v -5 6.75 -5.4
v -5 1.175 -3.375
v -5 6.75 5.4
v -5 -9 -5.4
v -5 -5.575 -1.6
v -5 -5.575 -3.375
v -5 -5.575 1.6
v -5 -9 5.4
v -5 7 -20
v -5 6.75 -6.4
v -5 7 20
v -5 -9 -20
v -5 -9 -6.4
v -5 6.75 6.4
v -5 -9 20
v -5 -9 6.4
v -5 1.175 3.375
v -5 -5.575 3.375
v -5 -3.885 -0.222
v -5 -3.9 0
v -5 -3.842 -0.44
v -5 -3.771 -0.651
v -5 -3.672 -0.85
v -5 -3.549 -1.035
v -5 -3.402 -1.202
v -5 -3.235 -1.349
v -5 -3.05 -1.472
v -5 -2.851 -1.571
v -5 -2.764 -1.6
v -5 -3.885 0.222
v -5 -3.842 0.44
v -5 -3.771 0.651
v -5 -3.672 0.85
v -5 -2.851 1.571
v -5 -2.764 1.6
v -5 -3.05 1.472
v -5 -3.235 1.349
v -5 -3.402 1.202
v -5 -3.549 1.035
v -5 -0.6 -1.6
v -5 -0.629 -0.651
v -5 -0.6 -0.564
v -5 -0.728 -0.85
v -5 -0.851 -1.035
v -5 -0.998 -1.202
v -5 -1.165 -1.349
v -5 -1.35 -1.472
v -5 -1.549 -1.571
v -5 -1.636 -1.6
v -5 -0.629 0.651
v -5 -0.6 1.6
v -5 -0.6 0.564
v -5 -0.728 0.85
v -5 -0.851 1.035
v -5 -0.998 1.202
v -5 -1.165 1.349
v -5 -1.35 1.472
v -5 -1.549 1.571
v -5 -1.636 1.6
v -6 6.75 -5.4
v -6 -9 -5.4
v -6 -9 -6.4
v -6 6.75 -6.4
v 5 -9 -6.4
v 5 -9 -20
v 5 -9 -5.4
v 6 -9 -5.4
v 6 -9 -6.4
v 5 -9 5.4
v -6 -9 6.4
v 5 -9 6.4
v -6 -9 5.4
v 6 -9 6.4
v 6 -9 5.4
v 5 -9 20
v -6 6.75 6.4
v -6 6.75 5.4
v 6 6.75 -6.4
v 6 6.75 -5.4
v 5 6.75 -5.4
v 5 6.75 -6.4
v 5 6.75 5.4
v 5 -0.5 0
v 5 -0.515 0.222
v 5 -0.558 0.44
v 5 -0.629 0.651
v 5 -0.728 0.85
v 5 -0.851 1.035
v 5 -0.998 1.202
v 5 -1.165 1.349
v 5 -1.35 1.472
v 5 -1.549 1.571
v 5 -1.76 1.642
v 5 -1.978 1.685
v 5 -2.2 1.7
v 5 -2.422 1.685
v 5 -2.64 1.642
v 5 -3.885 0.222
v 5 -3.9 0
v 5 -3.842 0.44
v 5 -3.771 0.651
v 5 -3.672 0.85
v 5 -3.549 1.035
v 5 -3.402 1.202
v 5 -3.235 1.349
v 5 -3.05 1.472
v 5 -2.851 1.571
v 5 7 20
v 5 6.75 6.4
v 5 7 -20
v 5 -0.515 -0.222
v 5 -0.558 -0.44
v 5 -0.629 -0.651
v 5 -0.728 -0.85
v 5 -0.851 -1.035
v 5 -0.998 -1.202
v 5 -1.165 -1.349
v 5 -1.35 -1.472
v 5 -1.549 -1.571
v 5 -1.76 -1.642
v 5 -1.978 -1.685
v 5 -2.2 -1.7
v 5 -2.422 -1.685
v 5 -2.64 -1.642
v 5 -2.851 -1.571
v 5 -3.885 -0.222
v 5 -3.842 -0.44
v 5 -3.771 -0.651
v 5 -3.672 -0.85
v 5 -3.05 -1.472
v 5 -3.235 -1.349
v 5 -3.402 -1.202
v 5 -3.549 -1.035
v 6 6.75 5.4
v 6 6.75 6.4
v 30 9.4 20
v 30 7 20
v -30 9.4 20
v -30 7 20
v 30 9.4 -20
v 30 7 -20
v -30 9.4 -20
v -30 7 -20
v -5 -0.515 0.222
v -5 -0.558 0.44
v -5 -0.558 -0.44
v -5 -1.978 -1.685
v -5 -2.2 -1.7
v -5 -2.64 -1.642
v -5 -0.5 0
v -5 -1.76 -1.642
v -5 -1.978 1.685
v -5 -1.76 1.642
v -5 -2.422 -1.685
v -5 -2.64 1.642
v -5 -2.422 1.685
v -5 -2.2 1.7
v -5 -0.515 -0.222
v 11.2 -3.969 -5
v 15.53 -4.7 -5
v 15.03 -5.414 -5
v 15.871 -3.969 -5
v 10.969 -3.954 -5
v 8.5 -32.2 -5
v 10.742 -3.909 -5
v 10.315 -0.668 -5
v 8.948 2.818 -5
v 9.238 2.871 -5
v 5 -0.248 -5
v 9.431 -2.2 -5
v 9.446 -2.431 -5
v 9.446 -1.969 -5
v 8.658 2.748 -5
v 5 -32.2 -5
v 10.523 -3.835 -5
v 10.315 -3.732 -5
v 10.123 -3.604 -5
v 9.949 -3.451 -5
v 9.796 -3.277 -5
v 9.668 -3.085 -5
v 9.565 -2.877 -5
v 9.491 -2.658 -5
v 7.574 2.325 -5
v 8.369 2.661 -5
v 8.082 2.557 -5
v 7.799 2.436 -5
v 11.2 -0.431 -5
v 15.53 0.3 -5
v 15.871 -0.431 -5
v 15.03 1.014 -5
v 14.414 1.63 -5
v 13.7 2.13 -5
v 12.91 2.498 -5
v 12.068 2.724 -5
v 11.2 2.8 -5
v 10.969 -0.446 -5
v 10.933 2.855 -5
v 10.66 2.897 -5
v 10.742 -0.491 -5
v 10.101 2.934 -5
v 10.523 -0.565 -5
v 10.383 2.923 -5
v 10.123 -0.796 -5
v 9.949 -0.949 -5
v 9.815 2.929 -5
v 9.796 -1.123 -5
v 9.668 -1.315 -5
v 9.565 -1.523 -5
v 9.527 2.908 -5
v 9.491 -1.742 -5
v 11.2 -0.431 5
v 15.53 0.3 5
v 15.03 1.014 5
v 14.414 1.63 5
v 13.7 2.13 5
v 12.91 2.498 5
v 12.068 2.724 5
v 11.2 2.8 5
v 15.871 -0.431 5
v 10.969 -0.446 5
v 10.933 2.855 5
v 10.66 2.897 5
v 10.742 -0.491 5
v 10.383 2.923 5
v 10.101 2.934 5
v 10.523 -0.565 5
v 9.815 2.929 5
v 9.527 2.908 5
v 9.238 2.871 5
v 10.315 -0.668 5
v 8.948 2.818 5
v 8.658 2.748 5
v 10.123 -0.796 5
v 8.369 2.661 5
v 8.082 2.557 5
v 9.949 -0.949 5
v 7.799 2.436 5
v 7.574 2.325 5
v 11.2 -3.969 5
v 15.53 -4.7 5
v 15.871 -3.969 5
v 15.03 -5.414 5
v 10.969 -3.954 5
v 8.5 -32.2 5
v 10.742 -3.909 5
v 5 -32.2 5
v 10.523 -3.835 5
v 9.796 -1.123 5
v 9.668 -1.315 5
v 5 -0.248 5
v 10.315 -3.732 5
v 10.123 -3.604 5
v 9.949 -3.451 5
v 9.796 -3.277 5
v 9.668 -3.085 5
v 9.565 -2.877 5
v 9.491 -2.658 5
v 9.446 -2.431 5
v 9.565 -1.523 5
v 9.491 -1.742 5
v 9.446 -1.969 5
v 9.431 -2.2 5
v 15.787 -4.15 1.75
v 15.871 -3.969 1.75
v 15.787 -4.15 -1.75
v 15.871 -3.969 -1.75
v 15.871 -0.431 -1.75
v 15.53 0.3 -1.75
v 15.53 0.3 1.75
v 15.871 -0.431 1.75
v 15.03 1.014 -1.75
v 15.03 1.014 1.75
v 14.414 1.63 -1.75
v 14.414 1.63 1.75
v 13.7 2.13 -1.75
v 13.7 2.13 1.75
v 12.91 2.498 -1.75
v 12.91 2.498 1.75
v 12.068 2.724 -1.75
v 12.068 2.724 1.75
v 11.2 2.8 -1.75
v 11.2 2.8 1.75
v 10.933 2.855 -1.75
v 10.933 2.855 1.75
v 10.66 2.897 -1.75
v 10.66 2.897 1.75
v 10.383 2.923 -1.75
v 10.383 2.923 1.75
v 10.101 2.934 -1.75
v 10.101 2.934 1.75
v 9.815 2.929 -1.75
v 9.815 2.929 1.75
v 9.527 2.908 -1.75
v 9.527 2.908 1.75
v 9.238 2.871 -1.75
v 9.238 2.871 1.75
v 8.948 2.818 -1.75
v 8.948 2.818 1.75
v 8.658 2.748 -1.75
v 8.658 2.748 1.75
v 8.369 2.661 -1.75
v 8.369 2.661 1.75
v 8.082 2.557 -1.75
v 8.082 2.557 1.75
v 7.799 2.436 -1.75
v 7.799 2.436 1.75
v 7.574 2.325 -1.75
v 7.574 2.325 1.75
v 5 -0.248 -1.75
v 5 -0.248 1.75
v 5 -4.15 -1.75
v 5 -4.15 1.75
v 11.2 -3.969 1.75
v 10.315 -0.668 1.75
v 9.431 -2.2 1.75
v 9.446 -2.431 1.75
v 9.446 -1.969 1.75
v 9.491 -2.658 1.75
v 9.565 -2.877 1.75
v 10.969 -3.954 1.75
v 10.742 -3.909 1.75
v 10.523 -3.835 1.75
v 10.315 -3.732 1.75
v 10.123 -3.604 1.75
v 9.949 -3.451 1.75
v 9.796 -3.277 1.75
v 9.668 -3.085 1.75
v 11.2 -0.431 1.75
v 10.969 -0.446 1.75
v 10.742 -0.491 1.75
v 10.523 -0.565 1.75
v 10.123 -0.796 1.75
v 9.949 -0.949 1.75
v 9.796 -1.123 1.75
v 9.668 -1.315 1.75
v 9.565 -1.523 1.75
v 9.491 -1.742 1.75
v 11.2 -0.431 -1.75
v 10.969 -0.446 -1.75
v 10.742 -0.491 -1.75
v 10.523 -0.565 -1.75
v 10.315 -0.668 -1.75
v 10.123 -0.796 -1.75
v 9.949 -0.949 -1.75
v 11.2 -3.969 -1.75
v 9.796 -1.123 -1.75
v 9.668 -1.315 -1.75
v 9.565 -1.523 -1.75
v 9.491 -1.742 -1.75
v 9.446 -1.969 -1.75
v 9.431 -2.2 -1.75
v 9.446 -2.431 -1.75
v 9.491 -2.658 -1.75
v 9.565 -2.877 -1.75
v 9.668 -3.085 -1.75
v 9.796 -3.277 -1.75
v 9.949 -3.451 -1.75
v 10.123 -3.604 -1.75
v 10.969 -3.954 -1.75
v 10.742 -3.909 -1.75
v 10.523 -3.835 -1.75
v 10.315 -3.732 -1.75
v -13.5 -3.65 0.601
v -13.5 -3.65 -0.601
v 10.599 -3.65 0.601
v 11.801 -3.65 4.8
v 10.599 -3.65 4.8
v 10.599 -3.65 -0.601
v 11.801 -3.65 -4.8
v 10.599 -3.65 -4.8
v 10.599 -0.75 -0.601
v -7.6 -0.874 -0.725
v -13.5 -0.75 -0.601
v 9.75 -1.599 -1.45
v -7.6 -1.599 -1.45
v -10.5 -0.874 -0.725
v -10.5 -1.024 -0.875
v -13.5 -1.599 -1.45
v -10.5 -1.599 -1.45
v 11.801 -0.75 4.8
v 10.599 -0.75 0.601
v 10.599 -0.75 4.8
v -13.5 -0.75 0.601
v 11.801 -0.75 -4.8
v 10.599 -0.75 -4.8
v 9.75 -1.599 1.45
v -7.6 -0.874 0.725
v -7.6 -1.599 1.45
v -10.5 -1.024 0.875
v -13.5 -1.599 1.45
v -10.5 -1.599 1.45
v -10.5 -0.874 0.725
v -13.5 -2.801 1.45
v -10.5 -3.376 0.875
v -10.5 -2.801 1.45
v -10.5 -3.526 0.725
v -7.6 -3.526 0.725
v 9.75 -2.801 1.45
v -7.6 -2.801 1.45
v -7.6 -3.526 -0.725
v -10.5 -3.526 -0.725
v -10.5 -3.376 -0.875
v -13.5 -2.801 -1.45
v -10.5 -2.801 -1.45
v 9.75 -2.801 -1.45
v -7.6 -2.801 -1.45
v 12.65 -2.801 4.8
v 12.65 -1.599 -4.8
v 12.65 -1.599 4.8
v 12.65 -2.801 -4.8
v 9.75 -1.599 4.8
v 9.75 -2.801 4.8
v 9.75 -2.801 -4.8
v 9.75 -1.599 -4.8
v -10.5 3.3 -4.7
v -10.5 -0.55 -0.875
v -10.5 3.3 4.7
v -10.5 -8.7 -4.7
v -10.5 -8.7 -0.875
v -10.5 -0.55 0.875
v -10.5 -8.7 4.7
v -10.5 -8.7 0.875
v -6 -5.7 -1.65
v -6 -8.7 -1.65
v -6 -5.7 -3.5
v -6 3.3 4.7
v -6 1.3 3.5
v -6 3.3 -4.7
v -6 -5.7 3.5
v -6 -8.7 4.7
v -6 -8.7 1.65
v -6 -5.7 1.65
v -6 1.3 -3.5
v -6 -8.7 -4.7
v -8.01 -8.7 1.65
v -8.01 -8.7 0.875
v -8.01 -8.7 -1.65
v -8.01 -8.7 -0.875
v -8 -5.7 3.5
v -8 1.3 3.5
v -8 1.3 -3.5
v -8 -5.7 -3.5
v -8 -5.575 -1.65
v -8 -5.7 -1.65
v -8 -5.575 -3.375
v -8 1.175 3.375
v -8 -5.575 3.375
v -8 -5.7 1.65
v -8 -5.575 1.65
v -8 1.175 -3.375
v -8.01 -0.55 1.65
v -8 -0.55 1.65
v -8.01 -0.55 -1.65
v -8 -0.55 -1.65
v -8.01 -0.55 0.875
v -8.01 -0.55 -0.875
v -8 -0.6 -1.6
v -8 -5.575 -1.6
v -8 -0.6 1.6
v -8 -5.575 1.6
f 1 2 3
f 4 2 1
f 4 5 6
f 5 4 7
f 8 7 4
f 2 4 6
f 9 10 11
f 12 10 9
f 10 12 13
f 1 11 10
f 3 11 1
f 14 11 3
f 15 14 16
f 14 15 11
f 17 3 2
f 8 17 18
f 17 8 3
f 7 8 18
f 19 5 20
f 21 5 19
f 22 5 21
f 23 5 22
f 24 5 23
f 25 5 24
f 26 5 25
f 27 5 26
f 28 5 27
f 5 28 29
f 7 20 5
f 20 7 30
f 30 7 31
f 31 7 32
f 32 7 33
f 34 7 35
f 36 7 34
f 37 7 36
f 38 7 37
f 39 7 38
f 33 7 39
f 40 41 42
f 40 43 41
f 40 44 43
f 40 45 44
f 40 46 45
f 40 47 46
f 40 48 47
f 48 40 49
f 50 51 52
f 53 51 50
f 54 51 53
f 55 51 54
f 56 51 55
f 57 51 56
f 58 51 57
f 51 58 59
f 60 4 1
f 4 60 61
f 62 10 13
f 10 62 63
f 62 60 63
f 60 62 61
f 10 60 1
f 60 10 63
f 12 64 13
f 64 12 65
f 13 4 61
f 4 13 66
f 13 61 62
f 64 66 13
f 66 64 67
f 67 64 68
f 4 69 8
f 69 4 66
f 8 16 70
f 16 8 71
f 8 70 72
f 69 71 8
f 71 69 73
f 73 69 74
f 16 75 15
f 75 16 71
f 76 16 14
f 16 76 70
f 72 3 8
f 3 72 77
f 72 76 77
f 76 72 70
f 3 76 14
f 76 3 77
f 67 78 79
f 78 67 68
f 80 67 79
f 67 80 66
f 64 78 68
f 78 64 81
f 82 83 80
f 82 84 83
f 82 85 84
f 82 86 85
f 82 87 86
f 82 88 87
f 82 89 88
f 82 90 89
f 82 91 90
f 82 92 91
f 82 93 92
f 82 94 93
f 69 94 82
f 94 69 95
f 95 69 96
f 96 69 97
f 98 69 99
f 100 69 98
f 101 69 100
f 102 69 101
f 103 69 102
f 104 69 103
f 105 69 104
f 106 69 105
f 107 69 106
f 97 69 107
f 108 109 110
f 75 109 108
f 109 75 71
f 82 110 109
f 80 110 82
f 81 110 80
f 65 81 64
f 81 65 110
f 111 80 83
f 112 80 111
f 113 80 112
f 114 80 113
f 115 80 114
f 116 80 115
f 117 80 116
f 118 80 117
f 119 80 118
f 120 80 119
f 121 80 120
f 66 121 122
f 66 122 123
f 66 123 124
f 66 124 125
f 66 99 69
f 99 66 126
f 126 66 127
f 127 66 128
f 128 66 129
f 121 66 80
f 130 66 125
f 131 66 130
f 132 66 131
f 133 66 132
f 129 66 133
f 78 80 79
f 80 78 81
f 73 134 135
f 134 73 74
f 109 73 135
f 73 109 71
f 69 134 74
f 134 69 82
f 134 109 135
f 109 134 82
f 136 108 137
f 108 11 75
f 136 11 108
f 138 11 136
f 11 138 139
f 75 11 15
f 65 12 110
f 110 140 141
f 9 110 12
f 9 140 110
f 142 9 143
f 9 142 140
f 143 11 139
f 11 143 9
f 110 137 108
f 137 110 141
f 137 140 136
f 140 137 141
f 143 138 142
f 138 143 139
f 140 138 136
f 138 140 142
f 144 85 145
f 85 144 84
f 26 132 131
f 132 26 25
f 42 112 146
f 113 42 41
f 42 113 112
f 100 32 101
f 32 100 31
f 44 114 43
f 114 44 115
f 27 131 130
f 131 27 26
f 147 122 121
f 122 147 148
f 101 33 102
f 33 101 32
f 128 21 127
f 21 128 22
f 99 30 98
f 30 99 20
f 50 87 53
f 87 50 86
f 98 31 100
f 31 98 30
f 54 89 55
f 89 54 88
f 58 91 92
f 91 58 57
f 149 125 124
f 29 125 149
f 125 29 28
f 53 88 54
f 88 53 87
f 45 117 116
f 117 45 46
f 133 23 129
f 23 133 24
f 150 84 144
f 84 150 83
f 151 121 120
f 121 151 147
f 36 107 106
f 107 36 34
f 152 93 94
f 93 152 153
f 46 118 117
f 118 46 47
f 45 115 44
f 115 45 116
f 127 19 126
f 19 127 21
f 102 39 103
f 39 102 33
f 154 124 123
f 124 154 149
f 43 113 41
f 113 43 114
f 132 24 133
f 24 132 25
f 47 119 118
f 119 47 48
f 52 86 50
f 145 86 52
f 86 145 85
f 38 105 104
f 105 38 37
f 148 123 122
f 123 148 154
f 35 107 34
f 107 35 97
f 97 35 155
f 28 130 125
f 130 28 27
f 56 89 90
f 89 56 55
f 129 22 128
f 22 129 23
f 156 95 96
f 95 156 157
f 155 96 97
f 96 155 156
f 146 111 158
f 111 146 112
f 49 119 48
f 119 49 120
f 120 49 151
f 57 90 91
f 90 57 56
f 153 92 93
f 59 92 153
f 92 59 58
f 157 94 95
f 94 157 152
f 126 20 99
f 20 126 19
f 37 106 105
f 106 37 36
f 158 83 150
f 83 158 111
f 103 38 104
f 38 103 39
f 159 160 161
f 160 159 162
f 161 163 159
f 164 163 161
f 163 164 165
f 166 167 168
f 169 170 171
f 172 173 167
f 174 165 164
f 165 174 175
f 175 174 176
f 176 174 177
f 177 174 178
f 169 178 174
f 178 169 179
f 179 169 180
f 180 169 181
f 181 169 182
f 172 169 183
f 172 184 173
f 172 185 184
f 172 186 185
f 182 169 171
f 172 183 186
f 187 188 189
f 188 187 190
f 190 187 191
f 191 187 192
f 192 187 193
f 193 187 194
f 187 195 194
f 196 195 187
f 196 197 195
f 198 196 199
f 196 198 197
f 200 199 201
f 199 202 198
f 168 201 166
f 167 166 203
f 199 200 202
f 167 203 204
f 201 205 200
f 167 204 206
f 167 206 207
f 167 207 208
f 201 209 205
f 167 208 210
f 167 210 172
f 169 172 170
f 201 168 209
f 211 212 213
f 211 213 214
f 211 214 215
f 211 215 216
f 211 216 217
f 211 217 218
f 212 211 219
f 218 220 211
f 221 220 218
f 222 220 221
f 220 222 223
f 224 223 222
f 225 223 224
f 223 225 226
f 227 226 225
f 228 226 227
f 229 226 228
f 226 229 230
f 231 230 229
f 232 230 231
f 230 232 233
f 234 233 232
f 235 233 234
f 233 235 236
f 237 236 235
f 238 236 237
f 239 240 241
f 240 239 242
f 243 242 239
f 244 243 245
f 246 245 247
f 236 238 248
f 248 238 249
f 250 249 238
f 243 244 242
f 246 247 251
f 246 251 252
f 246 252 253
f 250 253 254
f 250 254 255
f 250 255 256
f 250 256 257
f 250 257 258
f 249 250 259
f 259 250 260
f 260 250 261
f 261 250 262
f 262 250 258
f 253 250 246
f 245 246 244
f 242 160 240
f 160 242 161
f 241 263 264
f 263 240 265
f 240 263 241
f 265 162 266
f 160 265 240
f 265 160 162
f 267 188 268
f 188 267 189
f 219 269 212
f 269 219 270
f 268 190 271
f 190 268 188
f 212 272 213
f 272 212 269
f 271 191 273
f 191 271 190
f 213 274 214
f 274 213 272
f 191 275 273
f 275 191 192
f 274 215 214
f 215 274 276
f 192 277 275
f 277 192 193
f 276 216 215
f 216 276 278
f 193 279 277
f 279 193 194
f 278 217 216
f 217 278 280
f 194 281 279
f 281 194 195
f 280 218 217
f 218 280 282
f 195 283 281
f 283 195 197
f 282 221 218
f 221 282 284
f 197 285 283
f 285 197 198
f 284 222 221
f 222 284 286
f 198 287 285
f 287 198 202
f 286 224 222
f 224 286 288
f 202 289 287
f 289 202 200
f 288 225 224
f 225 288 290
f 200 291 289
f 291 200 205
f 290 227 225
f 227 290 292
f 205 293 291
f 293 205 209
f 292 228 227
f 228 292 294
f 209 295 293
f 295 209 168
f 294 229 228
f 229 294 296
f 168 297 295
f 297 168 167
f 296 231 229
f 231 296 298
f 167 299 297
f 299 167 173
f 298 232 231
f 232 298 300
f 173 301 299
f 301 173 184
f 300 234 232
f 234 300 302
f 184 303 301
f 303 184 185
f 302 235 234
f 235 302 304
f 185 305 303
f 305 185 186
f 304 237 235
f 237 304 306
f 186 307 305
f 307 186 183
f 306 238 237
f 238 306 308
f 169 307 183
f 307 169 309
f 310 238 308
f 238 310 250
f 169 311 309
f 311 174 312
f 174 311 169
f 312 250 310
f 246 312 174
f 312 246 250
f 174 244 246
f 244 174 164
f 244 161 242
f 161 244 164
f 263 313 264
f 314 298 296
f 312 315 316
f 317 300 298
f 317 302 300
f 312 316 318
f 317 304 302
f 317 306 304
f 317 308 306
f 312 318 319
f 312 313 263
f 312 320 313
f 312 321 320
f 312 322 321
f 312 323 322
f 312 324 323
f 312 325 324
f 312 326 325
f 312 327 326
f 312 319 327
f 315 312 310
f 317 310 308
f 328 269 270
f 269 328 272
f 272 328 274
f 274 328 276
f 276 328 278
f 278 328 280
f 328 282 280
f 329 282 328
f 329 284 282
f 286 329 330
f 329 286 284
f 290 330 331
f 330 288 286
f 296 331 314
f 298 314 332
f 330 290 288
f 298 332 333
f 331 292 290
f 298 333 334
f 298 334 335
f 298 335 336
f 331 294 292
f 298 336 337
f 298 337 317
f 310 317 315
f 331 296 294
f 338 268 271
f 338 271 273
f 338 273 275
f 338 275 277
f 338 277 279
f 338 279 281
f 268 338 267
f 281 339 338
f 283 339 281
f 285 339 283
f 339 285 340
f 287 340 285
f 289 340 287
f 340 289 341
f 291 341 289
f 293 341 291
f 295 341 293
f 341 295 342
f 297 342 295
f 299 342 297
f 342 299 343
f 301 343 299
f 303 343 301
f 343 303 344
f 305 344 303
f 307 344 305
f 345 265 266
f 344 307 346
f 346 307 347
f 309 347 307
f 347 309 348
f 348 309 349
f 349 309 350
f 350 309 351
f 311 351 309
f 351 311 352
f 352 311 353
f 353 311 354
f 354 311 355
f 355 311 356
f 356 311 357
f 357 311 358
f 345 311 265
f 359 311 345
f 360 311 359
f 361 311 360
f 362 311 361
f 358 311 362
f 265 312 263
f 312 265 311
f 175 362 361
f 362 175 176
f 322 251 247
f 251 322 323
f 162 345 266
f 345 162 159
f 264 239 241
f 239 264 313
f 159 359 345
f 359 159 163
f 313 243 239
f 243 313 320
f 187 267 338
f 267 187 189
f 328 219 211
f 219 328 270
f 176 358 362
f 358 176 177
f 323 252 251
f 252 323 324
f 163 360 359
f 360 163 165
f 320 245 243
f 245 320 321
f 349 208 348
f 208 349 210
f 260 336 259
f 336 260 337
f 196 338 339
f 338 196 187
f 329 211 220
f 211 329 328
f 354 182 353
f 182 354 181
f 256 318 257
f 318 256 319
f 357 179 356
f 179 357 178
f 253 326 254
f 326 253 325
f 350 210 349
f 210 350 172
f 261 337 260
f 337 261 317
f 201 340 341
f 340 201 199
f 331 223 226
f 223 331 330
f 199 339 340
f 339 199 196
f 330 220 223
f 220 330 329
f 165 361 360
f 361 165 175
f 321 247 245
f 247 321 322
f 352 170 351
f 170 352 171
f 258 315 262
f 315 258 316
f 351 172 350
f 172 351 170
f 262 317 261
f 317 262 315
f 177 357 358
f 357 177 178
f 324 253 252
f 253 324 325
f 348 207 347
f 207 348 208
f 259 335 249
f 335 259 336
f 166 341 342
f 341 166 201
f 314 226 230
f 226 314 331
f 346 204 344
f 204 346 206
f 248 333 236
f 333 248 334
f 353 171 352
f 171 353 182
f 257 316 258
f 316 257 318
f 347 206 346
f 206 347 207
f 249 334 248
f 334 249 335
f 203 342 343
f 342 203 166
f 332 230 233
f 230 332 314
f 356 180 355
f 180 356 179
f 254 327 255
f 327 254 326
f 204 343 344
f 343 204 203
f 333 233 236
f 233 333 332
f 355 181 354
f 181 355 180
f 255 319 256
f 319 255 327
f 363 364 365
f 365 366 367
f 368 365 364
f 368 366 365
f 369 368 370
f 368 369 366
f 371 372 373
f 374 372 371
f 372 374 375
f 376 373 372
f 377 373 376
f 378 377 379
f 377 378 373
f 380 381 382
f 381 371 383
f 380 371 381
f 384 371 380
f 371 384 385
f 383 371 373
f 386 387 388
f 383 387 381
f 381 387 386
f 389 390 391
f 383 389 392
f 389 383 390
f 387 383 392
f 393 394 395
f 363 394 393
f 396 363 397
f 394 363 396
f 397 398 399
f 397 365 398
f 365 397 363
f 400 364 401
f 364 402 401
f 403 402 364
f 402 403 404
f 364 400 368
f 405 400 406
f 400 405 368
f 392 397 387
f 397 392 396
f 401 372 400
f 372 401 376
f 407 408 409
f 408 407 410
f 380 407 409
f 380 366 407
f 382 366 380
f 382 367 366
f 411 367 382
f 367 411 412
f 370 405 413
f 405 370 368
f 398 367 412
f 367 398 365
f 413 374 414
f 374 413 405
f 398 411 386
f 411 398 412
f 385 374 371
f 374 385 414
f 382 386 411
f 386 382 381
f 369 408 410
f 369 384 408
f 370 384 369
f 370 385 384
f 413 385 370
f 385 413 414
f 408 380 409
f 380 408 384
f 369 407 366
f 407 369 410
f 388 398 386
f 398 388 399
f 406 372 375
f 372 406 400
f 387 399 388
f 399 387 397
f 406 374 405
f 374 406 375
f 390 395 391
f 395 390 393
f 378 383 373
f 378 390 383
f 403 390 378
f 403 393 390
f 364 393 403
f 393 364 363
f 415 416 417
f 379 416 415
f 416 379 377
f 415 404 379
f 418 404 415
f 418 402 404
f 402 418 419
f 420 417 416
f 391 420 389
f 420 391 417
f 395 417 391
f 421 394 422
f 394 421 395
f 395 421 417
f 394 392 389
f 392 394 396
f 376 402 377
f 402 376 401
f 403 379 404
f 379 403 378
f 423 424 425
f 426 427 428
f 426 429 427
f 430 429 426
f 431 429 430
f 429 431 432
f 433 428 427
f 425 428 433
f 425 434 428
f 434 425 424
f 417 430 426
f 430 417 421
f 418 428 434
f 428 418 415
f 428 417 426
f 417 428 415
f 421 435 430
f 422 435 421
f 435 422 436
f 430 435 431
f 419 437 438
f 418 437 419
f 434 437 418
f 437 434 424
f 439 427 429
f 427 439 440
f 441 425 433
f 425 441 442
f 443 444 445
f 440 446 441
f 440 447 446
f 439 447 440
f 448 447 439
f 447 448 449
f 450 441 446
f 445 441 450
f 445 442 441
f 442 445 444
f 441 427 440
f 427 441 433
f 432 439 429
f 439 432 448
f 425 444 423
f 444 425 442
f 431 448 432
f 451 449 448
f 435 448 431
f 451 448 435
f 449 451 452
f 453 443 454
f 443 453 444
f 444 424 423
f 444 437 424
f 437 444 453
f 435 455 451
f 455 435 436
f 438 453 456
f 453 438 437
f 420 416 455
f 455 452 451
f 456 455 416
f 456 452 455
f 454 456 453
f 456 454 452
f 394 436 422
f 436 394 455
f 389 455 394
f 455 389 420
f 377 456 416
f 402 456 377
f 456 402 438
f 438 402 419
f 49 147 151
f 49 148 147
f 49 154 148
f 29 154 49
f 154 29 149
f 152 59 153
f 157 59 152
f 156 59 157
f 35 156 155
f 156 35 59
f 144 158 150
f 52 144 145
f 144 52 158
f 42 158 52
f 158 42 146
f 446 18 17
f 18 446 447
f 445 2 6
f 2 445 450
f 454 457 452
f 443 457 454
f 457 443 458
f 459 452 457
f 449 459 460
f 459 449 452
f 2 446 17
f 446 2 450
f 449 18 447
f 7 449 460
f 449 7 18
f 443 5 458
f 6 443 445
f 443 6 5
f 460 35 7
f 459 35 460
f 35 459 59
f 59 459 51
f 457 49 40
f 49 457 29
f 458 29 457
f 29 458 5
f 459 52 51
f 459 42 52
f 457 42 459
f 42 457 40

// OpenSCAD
// PETAL seam lever: a quick-release cam clamp for clip/lever seam stations. Millimeters.
// No screws. Three printed parts plus a printed TPU spring (or a small metal spring in the same pocket):
//   lever   - two cheeks with the cam profile, joined by the handle; an open slot takes the bar's cross pin
//   bar     - draw bar: cross pin (lever side), octagon shaft through both flange holes, neck + button (far side)
//   keeper  - slides up onto the neck from behind the dish, holds the spring against the far flange
//   spring  - TPU block in the keeper pocket (or swap in disc/coil springs)
// Install: bar through both holes from the lever side, keeper (with spring) up onto the neck from the rear,
// push the lever's open slot up onto the cross pin with the handle sticking straight out, then flip the handle
// down along the flange; it snaps over-center onto its flat. Release: flip the handle out, drop the lever off
// the pin, slide the keeper down.
//
// Station geometry comes from the PETAL generator (seam joint = "Both", where every station has the bolt
// hole and the clip window): 5 mm flat walls, guide ridges 10.8 mm apart, bore 2.2 mm below station level.
// World frame: X across the seam (seam plane X = 0, lever on +X), Y toward the shell (Y = 0 at the station
// level), Z along the seam.

part = "assembly";  // [assembly,lever,bar,keeper,spring,plate,installed_lever,installed_bar,installed_keeper,installed_spring]
closed = true;      // assembly view: handle down (clamped) or up (open)
$fn = 48;

// ---------- from the PETAL designer (Both mode) ----------
wall      = 5;      // each flange wall at a station (CLIP.wall)
hole_d    = 3.4;    // seam bore: 3.4 = M3 as generated; 4.5 = M4
hole_y    = -2.2;   // boltY() in Both mode
ridge_gap = 10.8;   // clear width between the two guide ridges (2 x (CLIP.width/2 + CLIP.clear))
shell_y   = 6.75;   // nothing may rise above this (CLIP.top)

// ---------- tuning ----------
hole_clr  = 0.25;   // bar corner-to-hole diametral clearance
stroke    = 1.2;    // net draw from handle-up to handle-down
hump      = 0.3;    // over-center: how far the cam lifts before it drops onto its flat
pre       = 0.3;    // spring preload with the handle up (keeps the keeper seated)
spring_t  = 4.5;    // free spring thickness (TPU: ~40% max squeeze at stroke + hump + pre)
pocket    = 7;      // square spring pocket in the keeper
pocket_d  = 2;      // pocket depth
lever_w   = 10;     // lever width, sits between the ridges
handle_l  = 30;     // handle length below the pivot
handle_t  = 3.5;    // handle thickness at the tip

// ---------- derived ----------
p    = floor((hole_d - hole_clr) * cos(22.5) * 10) / 10;   // bar section: octagon across flats
n    = 0.5 * p;                                            // neck width (balances neck vs shoulder area)
gap  = p + 0.6;                                            // central slot between the lever cheeks
rb   = p / 2 / cos(22.5) + 0.2;                            // pin slot half width
h_open = max(5, rb + 3);                                   // cam radius toward the wall, handle up
hf   = h_open + stroke;                                    // pivot-to-flat, handle down
rc   = hf + hump;                                          // peak radius at the flat's corner
yc   = sqrt(rc * rc - hf * hf);                            // corner height above the pivot
th_c = atan2(yc, -hf);                                     // corner angle
floor_t = 2.5;                                             // keeper floor (fork) thickness
button  = 3;
x_pf = -wall - (spring_t - pre);   // pocket floor, handle up
x_k  = x_pf - floor_t;             // keeper back face = button shoulder, handle up
pin_x = wall + h_open;             // pivot, handle up
kw = min(ridge_gap - 1.4, pocket + 2.4);
kb = 6.5; kt = pocket / 2 + 2;

echo(str("bar octagon ", p, " mm, neck ", n, " mm, pin slot ", 2 * rb, " mm, cheeks ", (lever_w - gap) / 2, " mm"));
echo(str("cam radius to the wall: open ", h_open, ", clamped flat ", hf, ", over-center peak ", rc));

// ---------- helpers ----------
module oct(d) rotate(22.5) circle(d = d / cos(22.5), $fn = 8);   // octagon, across flats d
// lever profile in the lever frame: pivot at origin, handle down, x away from the wall, y toward the shell
function spiral() = [for (i = [0:24]) let(t = 90 + (th_c - 90) * i / 24, r = h_open + (rc - h_open) * i / 24) [r * cos(t), r * sin(t)]];
function lever_pts() = concat(
  [[-hf, -handle_l], [-hf + handle_t, -handle_l]],
  [for (t = [-40:10:80]) [h_open * cos(t), h_open * sin(t)]],
  spiral(),
  [[-hf, yc]]);
module lever_profile() intersection() {
  polygon(lever_pts());
  // 45° print chamfer up from the flat's corner (the flat is the bed face)
  polygon([[-hf, yc], [40, yc + 40 + hf], [40, -60], [-hf, -60]]);
}

// ---------- parts (each modeled in its own working frame) ----------
module lever() difference() {
  translate([0, 0, -lever_w / 2]) linear_extrude(lever_w) lever_profile();
  // central slot for the bar: everything above the handle root, down through the flat
  translate([-50, -p / 2 - 0.5, -gap / 2]) cube([100, 50, gap]);
  // open pin slot through both cheeks, opening away from the wall
  translate([0, 0, -lever_w]) linear_extrude(2 * lever_w) { circle(r = rb); translate([0, -rb]) square([20, 2 * rb]); }
}

module bar() {   // world frame, handle up
  // cross pin
  translate([pin_x, hole_y, -(lever_w - 0.4) / 2]) linear_extrude(lever_w - 0.4) oct(p);
  // shaft from the pin to the neck
  translate([x_pf + 0.4, hole_y, 0]) rotate([0, 90, 0]) linear_extrude(pin_x - x_pf - 0.4) rotate(90) oct(p);
  // neck
  intersection() {
    translate([x_k - 0.01, hole_y, 0]) rotate([0, 90, 0]) linear_extrude(x_pf + 0.42 - x_k) rotate(90) oct(p);
    translate([x_k - 1, hole_y - p, -n / 2]) cube([floor_t + 2, 2 * p, n]);
  }
  // button
  translate([x_k - button, hole_y, 0]) rotate([0, 90, 0]) linear_extrude(button) rotate(90) oct(p);
}

module keeper() difference() {   // world frame, handle up
  translate([x_k, hole_y - kb, -kw / 2]) cube([x_pf + pocket_d - x_k, kb + kt, kw]);
  translate([x_pf, hole_y - pocket / 2, -pocket / 2]) cube([10, pocket, pocket]);                        // spring pocket
  translate([x_pf - 0.01, hole_y - kb - 1, -(p + 0.4) / 2]) cube([10, kb + 1 + p / 2 + 0.2, p + 0.4]);  // bar clearance
  translate([x_k - 1, hole_y - kb - 1, -(n + 0.3) / 2]) cube([floor_t + 2, kb + 1 + p / 2 + 0.2, n + 0.3]); // neck fork
}

module spring() difference() {   // world frame, free length, seated in the pocket
  translate([x_pf, hole_y - (pocket - 0.25) / 2, -(pocket - 0.25) / 2]) cube([spring_t, pocket - 0.25, pocket - 0.25]);
  translate([x_pf - 1, hole_y - pocket, -(p + 0.3) / 2]) cube([spring_t + 2, pocket + p / 2 + 0.15, p + 0.3]);
}

// ---------- station mock-up for the assembly view ----------
module station() color("lightgray") difference() {
  union() {
    translate([-wall, -9, -20]) cube([2 * wall, shell_y + 9 + 0.25, 40]);
    translate([-30, shell_y + 0.25, -20]) cube([60, 2.4, 40]);   // shell
    for (s = [-1, 1], k = [-1, 1]) translate([s > 0 ? wall : -wall - 1, -9, k > 0 ? ridge_gap / 2 : -ridge_gap / 2 - 1]) cube([1, shell_y + 9, 1]);
  }
  translate([-20, hole_y, 0]) rotate([0, 90, 0]) cylinder(d = hole_d, h = 40);
}

// ---------- print orientations ----------
// lever: flat face (x = -hf) on the bed, cheeks side by side; lever y -> X, z -> Y, x -> Z
module print_lever()  multmatrix([[0, 1, 0, 0], [0, 0, 1, 0], [1, 0, 0, hf], [0, 0, 0, 1]]) lever();
// bar: world Y up, everything flat on the bed; keeper: back face down, pocket up; spring: squeeze axis up
module print_bar()    translate([0, 0, p / 2 - hole_y]) rotate([90, 0, 0]) bar();
module print_keeper() multmatrix([[0, 1, 0, -hole_y], [0, 0, 1, 0], [1, 0, 0, -x_k], [0, 0, 0, 1]]) keeper();
module print_spring() multmatrix([[0, 1, 0, -hole_y], [0, 0, 1, 0], [1, 0, 0, -x_pf], [0, 0, 0, 1]]) spring();

module lever_world(c) translate([wall + (c ? hf : h_open), hole_y, 0]) rotate([0, 0, c ? 0 : 90]) lever();

// installed poses in the station frame (no mock station); the PETAL generator bundles these for its assembly view
module installed_lever()  lever_world(closed);
module installed_bar()    translate([closed ? stroke : 0, 0, 0]) bar();
module installed_keeper() translate([closed ? stroke : 0, 0, 0]) keeper();
module installed_spring() { s = closed ? stroke : 0; translate([s + x_pf, 0, 0]) scale([(spring_t - pre - s) / spring_t, 1, 1]) translate([-x_pf, 0, 0]) spring(); }

if (part == "assembly") {
  station();
  color("dimgray") installed_lever();
  color("firebrick") installed_bar();
  color("goldenrod") installed_keeper();
  color("khaki") installed_spring();
}
if (part == "installed_lever")  installed_lever();
if (part == "installed_bar")    installed_bar();
if (part == "installed_keeper") installed_keeper();
if (part == "installed_spring") installed_spring();
if (part == "lever")  print_lever();
if (part == "bar")    print_bar();
if (part == "keeper") print_keeper();
if (part == "spring") print_spring();
if (part == "plate") {
  print_lever();
  translate([0, 16, 0]) print_bar();
  translate([24, 0, 0]) print_keeper();
  translate([24, -15, 0]) print_spring();
}
